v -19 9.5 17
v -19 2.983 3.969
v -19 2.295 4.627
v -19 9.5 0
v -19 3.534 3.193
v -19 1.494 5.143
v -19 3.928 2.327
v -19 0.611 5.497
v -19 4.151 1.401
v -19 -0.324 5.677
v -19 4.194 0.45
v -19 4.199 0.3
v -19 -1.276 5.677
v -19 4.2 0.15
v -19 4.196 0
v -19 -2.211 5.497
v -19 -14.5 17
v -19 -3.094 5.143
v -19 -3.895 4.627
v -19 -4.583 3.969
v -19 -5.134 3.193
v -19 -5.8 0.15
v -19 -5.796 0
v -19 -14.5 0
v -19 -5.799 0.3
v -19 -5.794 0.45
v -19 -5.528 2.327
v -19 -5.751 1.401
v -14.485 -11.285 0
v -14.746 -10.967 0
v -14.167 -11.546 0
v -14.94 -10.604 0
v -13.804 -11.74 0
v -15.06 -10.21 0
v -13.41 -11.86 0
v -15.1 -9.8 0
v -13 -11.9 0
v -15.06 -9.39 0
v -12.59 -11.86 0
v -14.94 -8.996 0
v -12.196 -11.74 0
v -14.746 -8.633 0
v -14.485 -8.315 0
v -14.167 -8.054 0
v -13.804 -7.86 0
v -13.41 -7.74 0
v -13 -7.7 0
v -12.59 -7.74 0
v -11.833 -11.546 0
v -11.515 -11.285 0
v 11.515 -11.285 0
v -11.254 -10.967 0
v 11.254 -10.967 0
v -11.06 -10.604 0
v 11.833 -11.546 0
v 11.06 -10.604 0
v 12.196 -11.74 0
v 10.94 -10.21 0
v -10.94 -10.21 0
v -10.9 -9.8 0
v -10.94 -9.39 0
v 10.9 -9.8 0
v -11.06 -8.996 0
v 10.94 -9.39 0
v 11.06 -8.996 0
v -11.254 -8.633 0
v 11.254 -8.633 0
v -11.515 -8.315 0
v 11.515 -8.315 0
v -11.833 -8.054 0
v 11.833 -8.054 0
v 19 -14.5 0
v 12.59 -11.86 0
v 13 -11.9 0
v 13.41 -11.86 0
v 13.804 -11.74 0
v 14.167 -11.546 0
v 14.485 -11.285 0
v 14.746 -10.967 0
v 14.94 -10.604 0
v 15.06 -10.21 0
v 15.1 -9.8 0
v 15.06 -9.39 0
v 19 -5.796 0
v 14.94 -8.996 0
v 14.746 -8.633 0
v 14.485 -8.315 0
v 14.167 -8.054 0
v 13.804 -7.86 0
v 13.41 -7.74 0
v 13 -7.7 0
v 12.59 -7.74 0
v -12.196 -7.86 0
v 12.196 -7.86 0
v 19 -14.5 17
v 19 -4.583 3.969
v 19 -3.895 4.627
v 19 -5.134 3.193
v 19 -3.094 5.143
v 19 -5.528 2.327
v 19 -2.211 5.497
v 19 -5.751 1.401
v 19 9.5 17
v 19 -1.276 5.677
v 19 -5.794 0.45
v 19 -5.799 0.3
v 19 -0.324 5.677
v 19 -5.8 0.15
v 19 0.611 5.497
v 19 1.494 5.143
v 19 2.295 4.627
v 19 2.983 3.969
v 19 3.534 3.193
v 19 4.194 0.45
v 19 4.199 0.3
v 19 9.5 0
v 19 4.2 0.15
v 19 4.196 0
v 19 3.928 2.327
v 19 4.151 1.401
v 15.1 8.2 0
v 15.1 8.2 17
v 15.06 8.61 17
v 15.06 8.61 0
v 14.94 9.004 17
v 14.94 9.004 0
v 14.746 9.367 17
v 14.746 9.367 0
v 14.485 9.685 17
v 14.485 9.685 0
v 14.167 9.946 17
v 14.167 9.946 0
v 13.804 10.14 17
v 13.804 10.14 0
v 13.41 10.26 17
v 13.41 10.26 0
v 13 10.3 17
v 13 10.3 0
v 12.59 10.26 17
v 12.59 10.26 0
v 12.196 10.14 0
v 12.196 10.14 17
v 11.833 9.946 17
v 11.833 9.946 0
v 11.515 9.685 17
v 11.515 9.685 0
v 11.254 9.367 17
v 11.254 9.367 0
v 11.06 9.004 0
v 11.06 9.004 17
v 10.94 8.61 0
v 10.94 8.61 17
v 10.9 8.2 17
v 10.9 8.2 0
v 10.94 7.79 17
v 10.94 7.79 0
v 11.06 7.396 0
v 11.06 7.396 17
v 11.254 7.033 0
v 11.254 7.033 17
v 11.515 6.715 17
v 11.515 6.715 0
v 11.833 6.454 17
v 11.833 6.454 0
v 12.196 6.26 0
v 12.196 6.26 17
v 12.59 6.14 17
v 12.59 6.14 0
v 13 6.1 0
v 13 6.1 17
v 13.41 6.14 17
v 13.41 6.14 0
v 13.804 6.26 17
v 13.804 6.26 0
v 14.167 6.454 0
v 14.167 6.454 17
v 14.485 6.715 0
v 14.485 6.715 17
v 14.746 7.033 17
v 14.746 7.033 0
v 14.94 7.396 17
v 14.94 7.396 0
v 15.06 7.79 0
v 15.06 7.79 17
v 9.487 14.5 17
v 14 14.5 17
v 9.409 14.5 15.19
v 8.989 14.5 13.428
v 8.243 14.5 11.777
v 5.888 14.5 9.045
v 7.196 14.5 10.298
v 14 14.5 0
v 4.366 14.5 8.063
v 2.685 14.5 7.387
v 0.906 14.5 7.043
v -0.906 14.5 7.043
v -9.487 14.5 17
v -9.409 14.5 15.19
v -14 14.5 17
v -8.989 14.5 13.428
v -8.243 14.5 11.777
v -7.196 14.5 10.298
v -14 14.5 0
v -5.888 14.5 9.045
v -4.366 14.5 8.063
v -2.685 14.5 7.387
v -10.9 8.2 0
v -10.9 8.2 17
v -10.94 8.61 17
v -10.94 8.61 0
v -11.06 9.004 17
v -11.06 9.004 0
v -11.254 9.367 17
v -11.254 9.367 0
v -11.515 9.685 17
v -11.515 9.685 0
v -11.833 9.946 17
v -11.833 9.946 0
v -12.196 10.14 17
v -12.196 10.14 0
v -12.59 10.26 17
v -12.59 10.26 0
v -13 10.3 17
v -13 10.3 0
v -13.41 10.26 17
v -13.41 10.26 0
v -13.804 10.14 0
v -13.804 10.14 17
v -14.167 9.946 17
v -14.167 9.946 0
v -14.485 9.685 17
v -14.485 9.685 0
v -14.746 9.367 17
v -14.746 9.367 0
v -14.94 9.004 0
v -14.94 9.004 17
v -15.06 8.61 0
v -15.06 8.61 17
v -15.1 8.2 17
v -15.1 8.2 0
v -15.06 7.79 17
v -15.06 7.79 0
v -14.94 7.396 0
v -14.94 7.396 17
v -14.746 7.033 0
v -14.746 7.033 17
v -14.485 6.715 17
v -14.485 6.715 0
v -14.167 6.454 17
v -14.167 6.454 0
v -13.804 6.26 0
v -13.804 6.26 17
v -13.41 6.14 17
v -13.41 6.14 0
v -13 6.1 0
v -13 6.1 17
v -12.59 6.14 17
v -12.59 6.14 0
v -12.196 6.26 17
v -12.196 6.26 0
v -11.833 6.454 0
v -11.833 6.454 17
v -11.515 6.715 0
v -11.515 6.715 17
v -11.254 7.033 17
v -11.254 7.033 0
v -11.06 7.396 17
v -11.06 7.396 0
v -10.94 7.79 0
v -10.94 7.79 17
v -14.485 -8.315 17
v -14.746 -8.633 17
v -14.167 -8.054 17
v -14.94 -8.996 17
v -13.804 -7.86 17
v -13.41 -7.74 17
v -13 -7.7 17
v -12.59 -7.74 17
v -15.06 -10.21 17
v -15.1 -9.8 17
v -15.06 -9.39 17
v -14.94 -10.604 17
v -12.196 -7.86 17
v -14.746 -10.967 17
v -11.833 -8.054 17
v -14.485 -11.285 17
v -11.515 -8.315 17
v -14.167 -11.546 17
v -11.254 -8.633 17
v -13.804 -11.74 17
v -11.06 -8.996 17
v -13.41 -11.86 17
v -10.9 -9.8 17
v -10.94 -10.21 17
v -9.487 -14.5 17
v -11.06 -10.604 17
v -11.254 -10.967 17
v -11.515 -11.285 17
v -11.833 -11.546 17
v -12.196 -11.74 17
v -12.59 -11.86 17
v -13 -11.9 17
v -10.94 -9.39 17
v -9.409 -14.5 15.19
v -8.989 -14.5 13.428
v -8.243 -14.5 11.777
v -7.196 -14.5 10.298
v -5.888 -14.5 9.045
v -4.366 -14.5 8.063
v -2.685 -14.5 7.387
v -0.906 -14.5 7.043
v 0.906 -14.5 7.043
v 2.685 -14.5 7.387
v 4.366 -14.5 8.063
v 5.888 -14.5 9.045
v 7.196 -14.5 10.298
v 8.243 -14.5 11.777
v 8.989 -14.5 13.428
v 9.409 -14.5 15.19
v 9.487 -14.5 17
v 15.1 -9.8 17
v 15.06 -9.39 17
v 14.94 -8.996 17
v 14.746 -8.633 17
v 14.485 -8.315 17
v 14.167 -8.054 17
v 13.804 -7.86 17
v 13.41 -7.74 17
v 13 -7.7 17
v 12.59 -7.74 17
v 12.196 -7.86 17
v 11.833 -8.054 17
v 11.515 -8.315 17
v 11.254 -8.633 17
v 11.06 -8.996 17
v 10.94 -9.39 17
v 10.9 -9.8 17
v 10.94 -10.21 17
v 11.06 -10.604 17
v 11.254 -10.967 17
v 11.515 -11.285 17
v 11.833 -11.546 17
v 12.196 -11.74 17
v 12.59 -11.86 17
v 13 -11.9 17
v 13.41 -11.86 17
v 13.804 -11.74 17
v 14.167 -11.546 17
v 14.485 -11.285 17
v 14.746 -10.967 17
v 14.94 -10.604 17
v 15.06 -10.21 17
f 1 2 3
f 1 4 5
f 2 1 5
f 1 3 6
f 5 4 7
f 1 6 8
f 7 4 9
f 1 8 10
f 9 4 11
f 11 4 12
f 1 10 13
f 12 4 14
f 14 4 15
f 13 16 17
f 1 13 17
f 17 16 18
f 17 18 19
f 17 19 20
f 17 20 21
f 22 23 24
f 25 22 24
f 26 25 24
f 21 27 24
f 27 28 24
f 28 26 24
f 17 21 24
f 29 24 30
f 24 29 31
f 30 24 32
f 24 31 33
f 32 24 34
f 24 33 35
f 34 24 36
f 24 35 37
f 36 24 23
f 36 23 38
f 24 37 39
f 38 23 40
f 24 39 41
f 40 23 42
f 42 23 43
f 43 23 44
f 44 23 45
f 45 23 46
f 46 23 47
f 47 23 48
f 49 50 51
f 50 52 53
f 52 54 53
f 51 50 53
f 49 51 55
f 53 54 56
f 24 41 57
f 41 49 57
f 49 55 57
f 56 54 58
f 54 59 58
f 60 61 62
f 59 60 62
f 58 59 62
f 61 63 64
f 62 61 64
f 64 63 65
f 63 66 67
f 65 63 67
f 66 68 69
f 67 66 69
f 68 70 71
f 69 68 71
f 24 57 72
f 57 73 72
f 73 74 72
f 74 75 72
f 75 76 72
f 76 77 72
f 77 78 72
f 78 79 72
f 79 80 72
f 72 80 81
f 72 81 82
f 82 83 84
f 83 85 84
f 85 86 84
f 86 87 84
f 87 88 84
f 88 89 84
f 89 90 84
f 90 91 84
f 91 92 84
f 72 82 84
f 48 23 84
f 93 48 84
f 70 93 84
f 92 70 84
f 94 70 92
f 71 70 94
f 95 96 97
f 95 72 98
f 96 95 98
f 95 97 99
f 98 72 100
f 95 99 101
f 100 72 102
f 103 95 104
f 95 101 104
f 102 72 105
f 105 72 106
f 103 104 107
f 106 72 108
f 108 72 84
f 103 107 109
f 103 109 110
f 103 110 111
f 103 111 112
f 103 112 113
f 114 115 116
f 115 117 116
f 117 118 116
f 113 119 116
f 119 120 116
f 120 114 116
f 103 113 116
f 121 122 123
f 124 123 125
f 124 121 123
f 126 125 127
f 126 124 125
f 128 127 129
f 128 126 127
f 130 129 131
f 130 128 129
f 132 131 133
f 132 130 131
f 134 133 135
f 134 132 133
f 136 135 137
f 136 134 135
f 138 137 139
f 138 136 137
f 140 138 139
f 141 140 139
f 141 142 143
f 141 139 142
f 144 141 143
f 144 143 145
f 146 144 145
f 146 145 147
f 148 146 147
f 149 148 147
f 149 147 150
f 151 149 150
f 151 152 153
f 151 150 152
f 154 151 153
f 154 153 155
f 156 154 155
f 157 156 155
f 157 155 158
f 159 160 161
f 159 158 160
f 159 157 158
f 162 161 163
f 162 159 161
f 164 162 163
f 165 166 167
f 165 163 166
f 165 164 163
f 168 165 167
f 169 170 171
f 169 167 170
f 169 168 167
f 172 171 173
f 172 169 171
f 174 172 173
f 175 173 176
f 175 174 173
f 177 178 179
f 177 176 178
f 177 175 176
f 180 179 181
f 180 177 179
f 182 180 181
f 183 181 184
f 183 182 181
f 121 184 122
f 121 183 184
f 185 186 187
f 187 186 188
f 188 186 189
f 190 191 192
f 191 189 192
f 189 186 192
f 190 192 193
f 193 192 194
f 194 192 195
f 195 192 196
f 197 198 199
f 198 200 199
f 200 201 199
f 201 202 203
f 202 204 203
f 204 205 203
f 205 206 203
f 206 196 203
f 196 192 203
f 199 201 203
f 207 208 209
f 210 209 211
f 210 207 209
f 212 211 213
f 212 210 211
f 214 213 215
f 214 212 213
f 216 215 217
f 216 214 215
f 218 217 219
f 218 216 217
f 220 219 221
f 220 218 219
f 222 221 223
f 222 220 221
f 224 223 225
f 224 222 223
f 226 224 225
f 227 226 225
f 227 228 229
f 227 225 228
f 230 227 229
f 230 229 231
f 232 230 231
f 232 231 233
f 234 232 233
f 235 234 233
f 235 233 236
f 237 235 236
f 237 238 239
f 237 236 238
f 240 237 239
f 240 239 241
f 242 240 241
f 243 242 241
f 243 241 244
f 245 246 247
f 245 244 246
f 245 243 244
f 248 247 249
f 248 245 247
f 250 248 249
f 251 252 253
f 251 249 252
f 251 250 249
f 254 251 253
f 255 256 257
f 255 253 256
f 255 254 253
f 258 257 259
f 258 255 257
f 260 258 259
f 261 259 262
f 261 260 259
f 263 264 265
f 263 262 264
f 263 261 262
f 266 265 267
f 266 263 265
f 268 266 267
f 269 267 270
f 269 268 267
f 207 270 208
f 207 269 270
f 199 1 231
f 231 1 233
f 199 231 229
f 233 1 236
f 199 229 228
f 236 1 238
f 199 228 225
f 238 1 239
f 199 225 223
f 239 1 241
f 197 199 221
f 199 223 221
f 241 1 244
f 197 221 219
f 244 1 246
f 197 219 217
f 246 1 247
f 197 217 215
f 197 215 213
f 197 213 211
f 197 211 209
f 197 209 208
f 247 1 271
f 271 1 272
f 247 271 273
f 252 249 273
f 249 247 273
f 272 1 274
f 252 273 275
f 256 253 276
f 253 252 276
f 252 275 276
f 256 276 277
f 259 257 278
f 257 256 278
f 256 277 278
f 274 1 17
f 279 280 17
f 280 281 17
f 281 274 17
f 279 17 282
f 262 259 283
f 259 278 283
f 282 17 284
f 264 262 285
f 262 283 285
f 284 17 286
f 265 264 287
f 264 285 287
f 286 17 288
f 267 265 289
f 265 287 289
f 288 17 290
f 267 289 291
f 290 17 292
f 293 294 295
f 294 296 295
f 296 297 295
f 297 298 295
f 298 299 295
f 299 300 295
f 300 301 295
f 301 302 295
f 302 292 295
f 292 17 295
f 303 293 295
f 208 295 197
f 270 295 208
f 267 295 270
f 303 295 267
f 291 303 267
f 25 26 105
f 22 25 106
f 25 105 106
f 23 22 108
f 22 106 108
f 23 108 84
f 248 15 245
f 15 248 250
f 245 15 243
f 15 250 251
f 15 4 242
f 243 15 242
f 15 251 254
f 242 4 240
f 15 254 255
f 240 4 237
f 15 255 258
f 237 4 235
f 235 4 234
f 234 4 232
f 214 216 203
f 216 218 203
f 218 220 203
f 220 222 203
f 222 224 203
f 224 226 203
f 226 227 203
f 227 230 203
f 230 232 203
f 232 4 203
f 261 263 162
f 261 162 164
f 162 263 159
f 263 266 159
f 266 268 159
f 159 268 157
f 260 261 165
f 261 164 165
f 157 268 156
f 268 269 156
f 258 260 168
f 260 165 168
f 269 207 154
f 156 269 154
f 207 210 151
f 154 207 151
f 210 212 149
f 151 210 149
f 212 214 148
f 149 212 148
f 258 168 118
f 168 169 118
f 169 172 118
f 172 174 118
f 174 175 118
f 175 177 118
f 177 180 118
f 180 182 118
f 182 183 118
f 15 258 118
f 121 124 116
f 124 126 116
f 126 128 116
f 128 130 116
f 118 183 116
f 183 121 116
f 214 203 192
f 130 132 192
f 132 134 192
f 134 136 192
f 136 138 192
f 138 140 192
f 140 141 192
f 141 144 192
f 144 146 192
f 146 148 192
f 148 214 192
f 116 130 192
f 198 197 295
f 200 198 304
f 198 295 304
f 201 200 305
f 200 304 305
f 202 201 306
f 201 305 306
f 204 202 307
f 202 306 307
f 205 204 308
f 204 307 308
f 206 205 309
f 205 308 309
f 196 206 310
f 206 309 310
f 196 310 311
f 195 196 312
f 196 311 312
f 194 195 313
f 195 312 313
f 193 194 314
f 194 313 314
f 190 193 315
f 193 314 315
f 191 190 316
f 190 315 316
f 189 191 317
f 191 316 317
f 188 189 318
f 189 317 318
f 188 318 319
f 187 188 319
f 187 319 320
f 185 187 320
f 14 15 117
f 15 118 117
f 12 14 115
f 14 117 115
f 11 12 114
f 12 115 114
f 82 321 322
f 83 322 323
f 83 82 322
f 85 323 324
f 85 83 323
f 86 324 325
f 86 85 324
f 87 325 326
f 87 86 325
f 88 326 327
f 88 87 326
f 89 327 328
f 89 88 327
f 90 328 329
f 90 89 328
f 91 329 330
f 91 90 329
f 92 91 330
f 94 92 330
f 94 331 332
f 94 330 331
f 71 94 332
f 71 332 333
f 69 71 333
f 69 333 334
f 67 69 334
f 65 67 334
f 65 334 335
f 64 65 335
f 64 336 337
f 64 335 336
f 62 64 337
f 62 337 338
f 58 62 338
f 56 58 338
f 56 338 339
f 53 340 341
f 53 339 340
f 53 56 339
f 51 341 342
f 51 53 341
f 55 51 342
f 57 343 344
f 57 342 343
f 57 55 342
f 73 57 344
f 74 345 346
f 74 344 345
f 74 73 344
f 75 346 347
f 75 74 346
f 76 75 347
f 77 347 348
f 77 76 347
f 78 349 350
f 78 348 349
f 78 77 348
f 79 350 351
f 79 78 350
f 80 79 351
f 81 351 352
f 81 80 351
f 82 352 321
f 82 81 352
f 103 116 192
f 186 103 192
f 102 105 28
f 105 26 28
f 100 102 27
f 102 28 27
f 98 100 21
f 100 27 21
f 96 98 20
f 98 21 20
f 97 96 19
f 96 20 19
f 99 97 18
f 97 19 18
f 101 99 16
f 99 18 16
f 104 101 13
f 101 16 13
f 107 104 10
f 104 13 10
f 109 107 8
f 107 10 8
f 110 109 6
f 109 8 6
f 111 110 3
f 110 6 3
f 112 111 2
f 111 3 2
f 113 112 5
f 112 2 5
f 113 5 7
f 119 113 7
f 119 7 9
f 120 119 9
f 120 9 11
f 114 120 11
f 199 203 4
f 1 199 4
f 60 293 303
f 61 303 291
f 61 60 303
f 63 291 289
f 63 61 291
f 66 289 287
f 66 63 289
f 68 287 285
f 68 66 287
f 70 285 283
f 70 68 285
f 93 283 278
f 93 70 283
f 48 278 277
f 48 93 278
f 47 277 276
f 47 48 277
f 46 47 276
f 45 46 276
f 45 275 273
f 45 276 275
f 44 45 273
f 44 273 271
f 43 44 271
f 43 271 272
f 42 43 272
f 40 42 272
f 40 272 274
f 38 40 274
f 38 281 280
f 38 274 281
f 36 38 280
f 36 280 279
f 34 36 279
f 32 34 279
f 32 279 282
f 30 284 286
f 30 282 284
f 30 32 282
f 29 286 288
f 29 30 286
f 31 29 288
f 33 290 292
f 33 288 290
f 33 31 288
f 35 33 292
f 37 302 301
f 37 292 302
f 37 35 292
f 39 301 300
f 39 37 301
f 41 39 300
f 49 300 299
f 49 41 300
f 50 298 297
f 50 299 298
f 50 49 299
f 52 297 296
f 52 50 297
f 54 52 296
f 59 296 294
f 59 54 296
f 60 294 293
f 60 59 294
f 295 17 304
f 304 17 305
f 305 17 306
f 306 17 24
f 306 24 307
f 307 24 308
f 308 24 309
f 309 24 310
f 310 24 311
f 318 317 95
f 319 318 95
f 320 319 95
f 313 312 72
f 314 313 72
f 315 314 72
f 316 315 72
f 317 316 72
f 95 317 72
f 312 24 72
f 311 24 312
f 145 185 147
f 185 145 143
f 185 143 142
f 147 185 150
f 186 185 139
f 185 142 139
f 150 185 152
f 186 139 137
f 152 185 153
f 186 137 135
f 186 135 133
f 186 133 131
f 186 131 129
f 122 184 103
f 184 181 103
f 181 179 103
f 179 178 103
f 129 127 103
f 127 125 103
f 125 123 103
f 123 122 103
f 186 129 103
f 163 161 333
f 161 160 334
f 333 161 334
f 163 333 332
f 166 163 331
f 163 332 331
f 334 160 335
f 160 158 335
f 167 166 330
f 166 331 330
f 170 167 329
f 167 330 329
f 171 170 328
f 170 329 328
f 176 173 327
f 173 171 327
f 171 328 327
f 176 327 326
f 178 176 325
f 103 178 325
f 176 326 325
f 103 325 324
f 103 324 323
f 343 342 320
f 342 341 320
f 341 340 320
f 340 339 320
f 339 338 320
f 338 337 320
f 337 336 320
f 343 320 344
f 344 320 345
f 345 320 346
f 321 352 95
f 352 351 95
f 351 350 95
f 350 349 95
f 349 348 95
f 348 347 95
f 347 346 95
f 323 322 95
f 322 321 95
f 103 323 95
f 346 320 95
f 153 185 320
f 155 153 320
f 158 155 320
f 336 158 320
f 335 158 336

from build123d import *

# Parameters (mm, degrees)
F0_R     = 2.1
F1_DEPTH = 19
F2_R     = 9.5
F3_DEPTH = 29.001
F4_R     = 5
F5_DEPTH = 38.001
F6_W     = 74.916892
F6_H     = 3.990418
F7_DEPTH = 29.001
F8_R     = 5
F9_DEPTH = 38.001


with BuildPart() as f1:
    # F0 (on Top) → F1 (new body)
    with BuildSketch(Plane.XY):
        Polygon((14, 14.5), (-14, 14.5), (-19, 9.5), (-19, -14.5), (19, -14.5), (19, 9.5), align=None)
        with Locations((-13, -9.8)):
            Circle(F0_R, mode=Mode.SUBTRACT)
        with Locations((13, -9.8)):
            Circle(F0_R, mode=Mode.SUBTRACT)
        with Locations((-13, 8.2)):
            Circle(F0_R, mode=Mode.SUBTRACT)
        with Locations((13, 8.2)):
            Circle(F0_R, mode=Mode.SUBTRACT)
    extrude(amount=F1_DEPTH)

    # F2 (on face) → F3 (cut, through all)
    with BuildSketch(Plane.XZ.offset(14.5)):
        with Locations((0, 16.5)):
            Circle(F2_R)
    extrude(amount=-F3_DEPTH, mode=Mode.SUBTRACT)

    # F4 (on face) → F5 (cut, through all)
    with BuildSketch(Plane.YZ.offset(19)):
        with Locations((-0.8, 0.2)):
            Circle(F4_R)
    extrude(amount=-F5_DEPTH, mode=Mode.SUBTRACT)

    # F6 (on face) → F7 (cut, through all)
    with BuildSketch(Plane.XZ.offset(14.5)):
        with Locations((0.39847, 18.995209)):
            Rectangle(F6_W, F6_H)
    extrude(amount=-F7_DEPTH, mode=Mode.SUBTRACT)

    # F8 (on face) → F9 (cut, through all)
    with BuildSketch(Plane(origin=(-19, 0, 0), x_dir=(0, -1, 0), z_dir=(-1, 0, 0))):
        with Locations((0.8, 0.7)):
            Circle(F8_R)
    extrude(amount=-F9_DEPTH, mode=Mode.SUBTRACT)


solid = f1.part
